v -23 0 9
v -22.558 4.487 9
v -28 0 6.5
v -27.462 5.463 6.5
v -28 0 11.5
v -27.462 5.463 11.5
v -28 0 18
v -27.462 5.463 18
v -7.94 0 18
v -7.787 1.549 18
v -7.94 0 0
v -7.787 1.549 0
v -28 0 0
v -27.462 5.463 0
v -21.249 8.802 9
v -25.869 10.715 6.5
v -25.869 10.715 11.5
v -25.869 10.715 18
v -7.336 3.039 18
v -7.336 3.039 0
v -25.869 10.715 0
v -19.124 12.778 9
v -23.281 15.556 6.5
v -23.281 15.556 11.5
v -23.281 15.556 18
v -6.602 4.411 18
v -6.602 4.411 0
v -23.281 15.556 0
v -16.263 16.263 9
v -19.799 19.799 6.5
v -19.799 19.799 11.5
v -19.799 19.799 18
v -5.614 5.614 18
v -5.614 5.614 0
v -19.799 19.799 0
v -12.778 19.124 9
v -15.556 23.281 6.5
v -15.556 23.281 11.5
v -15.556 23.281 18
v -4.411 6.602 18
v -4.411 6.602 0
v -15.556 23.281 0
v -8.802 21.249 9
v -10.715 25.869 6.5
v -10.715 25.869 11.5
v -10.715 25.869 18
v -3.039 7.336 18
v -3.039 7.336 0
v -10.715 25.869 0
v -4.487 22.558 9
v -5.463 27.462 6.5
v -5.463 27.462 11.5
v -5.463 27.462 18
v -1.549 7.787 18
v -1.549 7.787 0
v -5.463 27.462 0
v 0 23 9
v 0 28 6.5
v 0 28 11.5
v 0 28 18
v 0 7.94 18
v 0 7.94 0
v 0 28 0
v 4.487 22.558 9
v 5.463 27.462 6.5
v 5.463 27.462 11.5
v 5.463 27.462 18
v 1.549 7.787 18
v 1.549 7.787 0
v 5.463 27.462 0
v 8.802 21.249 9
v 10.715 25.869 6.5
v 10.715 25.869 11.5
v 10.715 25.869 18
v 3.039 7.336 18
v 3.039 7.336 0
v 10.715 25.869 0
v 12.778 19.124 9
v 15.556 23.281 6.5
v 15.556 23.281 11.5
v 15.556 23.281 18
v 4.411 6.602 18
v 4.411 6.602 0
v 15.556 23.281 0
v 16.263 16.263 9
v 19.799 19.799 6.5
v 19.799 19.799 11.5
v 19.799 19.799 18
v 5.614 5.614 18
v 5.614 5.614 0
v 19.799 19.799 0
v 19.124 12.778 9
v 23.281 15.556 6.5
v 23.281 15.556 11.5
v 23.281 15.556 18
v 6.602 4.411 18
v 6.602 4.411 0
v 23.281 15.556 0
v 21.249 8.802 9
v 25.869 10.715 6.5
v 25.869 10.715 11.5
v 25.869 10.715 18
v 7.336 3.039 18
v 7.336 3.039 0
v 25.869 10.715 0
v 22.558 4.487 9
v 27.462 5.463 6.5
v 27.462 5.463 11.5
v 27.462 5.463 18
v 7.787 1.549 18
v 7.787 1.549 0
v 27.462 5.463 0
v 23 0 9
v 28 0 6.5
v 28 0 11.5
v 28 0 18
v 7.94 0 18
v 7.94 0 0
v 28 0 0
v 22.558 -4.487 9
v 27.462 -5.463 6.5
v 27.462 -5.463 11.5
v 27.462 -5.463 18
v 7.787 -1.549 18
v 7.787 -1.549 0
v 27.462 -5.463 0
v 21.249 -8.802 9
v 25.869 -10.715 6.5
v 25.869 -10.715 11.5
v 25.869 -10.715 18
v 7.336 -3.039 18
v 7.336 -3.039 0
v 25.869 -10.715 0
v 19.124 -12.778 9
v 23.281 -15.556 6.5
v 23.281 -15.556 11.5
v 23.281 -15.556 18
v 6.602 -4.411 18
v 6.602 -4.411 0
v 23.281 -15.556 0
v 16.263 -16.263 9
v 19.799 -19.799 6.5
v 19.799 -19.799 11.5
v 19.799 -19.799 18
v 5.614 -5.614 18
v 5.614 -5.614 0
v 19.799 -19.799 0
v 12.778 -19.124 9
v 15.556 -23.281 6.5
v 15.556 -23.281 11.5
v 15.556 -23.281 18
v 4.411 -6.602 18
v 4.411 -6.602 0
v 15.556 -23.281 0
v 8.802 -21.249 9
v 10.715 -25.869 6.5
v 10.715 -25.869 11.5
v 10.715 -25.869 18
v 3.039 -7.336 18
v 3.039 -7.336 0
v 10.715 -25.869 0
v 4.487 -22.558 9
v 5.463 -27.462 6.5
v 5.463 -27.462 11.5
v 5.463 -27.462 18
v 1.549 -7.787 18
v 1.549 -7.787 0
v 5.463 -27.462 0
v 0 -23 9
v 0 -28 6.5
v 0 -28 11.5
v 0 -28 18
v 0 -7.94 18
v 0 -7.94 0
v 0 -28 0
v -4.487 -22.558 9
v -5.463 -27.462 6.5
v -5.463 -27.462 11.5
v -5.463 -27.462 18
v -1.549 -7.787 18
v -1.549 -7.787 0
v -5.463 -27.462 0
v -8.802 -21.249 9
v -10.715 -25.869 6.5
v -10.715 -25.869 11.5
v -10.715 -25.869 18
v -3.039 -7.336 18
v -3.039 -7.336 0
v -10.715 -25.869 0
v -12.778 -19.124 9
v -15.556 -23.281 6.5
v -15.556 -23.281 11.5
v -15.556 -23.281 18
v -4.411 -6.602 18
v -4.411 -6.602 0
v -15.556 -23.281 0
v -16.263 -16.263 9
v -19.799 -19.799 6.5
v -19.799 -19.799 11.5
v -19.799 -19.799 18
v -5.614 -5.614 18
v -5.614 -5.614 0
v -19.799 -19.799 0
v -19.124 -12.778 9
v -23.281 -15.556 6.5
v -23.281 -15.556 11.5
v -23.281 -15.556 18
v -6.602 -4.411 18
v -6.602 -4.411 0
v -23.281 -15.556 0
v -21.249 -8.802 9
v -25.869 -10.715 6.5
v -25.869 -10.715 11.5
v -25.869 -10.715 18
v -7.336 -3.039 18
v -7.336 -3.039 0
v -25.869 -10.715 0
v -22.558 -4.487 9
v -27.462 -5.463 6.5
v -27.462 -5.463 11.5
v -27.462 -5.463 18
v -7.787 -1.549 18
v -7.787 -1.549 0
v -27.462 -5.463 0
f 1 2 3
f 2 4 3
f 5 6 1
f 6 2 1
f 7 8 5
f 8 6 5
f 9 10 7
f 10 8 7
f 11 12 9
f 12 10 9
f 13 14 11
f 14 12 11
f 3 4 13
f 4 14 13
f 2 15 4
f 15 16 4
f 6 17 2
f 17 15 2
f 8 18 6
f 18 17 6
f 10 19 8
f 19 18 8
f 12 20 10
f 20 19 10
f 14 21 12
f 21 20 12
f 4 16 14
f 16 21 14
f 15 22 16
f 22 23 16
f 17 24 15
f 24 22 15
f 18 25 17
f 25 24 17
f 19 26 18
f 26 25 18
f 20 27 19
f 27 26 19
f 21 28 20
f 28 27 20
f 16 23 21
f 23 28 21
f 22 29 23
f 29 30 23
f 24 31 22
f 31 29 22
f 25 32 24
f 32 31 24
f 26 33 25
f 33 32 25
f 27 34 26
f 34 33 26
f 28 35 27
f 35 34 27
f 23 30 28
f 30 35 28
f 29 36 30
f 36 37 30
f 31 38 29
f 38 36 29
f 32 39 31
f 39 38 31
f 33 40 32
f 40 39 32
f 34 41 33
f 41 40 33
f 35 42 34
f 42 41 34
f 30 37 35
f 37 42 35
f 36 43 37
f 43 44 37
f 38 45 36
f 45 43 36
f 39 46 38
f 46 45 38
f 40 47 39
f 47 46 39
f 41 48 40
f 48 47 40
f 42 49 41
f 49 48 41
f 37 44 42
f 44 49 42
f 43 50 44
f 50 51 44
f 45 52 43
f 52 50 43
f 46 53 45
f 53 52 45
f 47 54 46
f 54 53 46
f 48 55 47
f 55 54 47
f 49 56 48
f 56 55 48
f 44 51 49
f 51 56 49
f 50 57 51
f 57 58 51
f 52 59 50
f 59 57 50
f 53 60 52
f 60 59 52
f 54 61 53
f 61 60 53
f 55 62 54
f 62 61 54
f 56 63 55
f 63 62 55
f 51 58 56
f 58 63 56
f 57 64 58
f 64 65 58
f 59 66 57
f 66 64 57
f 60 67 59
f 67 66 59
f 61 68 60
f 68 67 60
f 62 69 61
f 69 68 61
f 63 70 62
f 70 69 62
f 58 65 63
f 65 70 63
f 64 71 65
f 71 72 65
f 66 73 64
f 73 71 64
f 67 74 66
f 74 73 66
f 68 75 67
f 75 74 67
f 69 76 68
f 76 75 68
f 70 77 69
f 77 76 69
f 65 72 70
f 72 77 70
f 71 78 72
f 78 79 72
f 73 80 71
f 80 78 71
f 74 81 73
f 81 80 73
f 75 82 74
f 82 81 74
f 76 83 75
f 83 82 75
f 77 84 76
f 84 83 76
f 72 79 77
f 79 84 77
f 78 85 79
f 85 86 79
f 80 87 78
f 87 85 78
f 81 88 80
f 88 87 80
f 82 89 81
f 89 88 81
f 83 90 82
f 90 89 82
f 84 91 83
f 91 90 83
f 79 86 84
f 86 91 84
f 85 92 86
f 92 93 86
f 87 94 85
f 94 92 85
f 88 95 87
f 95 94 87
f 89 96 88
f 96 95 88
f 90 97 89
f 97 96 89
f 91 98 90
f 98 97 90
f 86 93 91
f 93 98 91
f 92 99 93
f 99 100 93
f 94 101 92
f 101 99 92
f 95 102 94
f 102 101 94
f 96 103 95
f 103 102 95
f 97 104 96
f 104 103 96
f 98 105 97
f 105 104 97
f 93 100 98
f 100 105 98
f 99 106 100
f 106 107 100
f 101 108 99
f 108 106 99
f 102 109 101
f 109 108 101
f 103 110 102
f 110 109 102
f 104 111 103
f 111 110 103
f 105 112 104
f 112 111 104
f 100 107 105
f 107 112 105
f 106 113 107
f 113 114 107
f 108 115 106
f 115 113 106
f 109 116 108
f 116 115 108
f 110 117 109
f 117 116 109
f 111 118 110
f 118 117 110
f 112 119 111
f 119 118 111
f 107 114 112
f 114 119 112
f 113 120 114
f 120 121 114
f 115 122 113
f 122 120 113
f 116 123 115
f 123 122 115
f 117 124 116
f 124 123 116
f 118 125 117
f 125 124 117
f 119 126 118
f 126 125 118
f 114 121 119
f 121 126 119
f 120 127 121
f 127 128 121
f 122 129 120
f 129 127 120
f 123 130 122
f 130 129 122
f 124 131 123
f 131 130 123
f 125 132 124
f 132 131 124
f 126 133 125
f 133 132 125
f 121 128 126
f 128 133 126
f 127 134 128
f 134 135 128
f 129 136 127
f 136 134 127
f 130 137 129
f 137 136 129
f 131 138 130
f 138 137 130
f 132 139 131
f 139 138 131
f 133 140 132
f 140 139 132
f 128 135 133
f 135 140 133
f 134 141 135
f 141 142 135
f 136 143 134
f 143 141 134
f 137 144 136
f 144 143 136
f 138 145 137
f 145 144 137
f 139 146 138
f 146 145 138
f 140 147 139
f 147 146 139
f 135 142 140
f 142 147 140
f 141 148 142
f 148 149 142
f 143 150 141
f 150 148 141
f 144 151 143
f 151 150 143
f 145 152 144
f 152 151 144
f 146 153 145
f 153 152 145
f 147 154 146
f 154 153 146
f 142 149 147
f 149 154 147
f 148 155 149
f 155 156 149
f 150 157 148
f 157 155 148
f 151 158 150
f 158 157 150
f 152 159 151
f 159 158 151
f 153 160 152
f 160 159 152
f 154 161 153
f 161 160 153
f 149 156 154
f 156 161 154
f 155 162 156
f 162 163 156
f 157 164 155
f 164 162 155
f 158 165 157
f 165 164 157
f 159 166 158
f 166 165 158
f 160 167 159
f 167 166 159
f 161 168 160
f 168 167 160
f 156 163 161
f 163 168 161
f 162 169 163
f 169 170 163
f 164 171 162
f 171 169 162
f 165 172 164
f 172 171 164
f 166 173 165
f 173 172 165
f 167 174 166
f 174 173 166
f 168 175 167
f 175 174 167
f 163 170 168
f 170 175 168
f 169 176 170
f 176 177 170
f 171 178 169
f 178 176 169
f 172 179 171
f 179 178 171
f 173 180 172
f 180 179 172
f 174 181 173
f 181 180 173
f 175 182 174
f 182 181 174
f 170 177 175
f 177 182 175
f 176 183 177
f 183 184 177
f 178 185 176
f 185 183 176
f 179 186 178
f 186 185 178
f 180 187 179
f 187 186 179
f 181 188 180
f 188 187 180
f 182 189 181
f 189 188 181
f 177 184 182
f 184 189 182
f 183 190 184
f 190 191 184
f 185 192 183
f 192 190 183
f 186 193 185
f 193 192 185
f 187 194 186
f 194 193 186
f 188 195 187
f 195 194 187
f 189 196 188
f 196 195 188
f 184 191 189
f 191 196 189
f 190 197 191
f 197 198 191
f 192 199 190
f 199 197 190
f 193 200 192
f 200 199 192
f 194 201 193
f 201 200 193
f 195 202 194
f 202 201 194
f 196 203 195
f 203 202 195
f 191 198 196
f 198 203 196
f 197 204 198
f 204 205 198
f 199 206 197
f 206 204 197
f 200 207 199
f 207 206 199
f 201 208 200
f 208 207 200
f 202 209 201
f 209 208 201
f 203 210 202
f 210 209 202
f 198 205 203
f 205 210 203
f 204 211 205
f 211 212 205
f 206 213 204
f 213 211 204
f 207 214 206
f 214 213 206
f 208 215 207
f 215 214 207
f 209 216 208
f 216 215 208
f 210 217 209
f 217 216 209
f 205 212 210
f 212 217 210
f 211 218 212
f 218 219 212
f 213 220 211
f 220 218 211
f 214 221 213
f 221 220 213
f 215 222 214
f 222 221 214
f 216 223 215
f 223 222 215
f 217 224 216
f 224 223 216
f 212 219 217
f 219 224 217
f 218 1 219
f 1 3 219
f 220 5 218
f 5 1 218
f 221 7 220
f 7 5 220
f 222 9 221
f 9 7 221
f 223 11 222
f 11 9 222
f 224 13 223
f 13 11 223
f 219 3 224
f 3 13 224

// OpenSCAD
$fn = 32;

// ----------------------------------------------------------------------
// Belt roller: 56 mm barrel, 18 mm wide, bore 15.88 mm
// ----------------------------------------------------------------------

// --- parameters (mm) ---
bore_d = 15.88;           // bore
barrel_d = 56;            // barrel diameter
roller_w = 18;            // roller width
groove_w = 5;             // guide groove width
groove_d = 5;             // guide groove depth

roller_profile = [[7.94, 0], [28, 0], [28, 6.5], [23, 9], [28, 11.5], [28, 18], [7.94, 18]];

/* the profile stays clear of the axis, so the bore comes out of the revolve */
rotate_extrude() polygon(roller_profile);
